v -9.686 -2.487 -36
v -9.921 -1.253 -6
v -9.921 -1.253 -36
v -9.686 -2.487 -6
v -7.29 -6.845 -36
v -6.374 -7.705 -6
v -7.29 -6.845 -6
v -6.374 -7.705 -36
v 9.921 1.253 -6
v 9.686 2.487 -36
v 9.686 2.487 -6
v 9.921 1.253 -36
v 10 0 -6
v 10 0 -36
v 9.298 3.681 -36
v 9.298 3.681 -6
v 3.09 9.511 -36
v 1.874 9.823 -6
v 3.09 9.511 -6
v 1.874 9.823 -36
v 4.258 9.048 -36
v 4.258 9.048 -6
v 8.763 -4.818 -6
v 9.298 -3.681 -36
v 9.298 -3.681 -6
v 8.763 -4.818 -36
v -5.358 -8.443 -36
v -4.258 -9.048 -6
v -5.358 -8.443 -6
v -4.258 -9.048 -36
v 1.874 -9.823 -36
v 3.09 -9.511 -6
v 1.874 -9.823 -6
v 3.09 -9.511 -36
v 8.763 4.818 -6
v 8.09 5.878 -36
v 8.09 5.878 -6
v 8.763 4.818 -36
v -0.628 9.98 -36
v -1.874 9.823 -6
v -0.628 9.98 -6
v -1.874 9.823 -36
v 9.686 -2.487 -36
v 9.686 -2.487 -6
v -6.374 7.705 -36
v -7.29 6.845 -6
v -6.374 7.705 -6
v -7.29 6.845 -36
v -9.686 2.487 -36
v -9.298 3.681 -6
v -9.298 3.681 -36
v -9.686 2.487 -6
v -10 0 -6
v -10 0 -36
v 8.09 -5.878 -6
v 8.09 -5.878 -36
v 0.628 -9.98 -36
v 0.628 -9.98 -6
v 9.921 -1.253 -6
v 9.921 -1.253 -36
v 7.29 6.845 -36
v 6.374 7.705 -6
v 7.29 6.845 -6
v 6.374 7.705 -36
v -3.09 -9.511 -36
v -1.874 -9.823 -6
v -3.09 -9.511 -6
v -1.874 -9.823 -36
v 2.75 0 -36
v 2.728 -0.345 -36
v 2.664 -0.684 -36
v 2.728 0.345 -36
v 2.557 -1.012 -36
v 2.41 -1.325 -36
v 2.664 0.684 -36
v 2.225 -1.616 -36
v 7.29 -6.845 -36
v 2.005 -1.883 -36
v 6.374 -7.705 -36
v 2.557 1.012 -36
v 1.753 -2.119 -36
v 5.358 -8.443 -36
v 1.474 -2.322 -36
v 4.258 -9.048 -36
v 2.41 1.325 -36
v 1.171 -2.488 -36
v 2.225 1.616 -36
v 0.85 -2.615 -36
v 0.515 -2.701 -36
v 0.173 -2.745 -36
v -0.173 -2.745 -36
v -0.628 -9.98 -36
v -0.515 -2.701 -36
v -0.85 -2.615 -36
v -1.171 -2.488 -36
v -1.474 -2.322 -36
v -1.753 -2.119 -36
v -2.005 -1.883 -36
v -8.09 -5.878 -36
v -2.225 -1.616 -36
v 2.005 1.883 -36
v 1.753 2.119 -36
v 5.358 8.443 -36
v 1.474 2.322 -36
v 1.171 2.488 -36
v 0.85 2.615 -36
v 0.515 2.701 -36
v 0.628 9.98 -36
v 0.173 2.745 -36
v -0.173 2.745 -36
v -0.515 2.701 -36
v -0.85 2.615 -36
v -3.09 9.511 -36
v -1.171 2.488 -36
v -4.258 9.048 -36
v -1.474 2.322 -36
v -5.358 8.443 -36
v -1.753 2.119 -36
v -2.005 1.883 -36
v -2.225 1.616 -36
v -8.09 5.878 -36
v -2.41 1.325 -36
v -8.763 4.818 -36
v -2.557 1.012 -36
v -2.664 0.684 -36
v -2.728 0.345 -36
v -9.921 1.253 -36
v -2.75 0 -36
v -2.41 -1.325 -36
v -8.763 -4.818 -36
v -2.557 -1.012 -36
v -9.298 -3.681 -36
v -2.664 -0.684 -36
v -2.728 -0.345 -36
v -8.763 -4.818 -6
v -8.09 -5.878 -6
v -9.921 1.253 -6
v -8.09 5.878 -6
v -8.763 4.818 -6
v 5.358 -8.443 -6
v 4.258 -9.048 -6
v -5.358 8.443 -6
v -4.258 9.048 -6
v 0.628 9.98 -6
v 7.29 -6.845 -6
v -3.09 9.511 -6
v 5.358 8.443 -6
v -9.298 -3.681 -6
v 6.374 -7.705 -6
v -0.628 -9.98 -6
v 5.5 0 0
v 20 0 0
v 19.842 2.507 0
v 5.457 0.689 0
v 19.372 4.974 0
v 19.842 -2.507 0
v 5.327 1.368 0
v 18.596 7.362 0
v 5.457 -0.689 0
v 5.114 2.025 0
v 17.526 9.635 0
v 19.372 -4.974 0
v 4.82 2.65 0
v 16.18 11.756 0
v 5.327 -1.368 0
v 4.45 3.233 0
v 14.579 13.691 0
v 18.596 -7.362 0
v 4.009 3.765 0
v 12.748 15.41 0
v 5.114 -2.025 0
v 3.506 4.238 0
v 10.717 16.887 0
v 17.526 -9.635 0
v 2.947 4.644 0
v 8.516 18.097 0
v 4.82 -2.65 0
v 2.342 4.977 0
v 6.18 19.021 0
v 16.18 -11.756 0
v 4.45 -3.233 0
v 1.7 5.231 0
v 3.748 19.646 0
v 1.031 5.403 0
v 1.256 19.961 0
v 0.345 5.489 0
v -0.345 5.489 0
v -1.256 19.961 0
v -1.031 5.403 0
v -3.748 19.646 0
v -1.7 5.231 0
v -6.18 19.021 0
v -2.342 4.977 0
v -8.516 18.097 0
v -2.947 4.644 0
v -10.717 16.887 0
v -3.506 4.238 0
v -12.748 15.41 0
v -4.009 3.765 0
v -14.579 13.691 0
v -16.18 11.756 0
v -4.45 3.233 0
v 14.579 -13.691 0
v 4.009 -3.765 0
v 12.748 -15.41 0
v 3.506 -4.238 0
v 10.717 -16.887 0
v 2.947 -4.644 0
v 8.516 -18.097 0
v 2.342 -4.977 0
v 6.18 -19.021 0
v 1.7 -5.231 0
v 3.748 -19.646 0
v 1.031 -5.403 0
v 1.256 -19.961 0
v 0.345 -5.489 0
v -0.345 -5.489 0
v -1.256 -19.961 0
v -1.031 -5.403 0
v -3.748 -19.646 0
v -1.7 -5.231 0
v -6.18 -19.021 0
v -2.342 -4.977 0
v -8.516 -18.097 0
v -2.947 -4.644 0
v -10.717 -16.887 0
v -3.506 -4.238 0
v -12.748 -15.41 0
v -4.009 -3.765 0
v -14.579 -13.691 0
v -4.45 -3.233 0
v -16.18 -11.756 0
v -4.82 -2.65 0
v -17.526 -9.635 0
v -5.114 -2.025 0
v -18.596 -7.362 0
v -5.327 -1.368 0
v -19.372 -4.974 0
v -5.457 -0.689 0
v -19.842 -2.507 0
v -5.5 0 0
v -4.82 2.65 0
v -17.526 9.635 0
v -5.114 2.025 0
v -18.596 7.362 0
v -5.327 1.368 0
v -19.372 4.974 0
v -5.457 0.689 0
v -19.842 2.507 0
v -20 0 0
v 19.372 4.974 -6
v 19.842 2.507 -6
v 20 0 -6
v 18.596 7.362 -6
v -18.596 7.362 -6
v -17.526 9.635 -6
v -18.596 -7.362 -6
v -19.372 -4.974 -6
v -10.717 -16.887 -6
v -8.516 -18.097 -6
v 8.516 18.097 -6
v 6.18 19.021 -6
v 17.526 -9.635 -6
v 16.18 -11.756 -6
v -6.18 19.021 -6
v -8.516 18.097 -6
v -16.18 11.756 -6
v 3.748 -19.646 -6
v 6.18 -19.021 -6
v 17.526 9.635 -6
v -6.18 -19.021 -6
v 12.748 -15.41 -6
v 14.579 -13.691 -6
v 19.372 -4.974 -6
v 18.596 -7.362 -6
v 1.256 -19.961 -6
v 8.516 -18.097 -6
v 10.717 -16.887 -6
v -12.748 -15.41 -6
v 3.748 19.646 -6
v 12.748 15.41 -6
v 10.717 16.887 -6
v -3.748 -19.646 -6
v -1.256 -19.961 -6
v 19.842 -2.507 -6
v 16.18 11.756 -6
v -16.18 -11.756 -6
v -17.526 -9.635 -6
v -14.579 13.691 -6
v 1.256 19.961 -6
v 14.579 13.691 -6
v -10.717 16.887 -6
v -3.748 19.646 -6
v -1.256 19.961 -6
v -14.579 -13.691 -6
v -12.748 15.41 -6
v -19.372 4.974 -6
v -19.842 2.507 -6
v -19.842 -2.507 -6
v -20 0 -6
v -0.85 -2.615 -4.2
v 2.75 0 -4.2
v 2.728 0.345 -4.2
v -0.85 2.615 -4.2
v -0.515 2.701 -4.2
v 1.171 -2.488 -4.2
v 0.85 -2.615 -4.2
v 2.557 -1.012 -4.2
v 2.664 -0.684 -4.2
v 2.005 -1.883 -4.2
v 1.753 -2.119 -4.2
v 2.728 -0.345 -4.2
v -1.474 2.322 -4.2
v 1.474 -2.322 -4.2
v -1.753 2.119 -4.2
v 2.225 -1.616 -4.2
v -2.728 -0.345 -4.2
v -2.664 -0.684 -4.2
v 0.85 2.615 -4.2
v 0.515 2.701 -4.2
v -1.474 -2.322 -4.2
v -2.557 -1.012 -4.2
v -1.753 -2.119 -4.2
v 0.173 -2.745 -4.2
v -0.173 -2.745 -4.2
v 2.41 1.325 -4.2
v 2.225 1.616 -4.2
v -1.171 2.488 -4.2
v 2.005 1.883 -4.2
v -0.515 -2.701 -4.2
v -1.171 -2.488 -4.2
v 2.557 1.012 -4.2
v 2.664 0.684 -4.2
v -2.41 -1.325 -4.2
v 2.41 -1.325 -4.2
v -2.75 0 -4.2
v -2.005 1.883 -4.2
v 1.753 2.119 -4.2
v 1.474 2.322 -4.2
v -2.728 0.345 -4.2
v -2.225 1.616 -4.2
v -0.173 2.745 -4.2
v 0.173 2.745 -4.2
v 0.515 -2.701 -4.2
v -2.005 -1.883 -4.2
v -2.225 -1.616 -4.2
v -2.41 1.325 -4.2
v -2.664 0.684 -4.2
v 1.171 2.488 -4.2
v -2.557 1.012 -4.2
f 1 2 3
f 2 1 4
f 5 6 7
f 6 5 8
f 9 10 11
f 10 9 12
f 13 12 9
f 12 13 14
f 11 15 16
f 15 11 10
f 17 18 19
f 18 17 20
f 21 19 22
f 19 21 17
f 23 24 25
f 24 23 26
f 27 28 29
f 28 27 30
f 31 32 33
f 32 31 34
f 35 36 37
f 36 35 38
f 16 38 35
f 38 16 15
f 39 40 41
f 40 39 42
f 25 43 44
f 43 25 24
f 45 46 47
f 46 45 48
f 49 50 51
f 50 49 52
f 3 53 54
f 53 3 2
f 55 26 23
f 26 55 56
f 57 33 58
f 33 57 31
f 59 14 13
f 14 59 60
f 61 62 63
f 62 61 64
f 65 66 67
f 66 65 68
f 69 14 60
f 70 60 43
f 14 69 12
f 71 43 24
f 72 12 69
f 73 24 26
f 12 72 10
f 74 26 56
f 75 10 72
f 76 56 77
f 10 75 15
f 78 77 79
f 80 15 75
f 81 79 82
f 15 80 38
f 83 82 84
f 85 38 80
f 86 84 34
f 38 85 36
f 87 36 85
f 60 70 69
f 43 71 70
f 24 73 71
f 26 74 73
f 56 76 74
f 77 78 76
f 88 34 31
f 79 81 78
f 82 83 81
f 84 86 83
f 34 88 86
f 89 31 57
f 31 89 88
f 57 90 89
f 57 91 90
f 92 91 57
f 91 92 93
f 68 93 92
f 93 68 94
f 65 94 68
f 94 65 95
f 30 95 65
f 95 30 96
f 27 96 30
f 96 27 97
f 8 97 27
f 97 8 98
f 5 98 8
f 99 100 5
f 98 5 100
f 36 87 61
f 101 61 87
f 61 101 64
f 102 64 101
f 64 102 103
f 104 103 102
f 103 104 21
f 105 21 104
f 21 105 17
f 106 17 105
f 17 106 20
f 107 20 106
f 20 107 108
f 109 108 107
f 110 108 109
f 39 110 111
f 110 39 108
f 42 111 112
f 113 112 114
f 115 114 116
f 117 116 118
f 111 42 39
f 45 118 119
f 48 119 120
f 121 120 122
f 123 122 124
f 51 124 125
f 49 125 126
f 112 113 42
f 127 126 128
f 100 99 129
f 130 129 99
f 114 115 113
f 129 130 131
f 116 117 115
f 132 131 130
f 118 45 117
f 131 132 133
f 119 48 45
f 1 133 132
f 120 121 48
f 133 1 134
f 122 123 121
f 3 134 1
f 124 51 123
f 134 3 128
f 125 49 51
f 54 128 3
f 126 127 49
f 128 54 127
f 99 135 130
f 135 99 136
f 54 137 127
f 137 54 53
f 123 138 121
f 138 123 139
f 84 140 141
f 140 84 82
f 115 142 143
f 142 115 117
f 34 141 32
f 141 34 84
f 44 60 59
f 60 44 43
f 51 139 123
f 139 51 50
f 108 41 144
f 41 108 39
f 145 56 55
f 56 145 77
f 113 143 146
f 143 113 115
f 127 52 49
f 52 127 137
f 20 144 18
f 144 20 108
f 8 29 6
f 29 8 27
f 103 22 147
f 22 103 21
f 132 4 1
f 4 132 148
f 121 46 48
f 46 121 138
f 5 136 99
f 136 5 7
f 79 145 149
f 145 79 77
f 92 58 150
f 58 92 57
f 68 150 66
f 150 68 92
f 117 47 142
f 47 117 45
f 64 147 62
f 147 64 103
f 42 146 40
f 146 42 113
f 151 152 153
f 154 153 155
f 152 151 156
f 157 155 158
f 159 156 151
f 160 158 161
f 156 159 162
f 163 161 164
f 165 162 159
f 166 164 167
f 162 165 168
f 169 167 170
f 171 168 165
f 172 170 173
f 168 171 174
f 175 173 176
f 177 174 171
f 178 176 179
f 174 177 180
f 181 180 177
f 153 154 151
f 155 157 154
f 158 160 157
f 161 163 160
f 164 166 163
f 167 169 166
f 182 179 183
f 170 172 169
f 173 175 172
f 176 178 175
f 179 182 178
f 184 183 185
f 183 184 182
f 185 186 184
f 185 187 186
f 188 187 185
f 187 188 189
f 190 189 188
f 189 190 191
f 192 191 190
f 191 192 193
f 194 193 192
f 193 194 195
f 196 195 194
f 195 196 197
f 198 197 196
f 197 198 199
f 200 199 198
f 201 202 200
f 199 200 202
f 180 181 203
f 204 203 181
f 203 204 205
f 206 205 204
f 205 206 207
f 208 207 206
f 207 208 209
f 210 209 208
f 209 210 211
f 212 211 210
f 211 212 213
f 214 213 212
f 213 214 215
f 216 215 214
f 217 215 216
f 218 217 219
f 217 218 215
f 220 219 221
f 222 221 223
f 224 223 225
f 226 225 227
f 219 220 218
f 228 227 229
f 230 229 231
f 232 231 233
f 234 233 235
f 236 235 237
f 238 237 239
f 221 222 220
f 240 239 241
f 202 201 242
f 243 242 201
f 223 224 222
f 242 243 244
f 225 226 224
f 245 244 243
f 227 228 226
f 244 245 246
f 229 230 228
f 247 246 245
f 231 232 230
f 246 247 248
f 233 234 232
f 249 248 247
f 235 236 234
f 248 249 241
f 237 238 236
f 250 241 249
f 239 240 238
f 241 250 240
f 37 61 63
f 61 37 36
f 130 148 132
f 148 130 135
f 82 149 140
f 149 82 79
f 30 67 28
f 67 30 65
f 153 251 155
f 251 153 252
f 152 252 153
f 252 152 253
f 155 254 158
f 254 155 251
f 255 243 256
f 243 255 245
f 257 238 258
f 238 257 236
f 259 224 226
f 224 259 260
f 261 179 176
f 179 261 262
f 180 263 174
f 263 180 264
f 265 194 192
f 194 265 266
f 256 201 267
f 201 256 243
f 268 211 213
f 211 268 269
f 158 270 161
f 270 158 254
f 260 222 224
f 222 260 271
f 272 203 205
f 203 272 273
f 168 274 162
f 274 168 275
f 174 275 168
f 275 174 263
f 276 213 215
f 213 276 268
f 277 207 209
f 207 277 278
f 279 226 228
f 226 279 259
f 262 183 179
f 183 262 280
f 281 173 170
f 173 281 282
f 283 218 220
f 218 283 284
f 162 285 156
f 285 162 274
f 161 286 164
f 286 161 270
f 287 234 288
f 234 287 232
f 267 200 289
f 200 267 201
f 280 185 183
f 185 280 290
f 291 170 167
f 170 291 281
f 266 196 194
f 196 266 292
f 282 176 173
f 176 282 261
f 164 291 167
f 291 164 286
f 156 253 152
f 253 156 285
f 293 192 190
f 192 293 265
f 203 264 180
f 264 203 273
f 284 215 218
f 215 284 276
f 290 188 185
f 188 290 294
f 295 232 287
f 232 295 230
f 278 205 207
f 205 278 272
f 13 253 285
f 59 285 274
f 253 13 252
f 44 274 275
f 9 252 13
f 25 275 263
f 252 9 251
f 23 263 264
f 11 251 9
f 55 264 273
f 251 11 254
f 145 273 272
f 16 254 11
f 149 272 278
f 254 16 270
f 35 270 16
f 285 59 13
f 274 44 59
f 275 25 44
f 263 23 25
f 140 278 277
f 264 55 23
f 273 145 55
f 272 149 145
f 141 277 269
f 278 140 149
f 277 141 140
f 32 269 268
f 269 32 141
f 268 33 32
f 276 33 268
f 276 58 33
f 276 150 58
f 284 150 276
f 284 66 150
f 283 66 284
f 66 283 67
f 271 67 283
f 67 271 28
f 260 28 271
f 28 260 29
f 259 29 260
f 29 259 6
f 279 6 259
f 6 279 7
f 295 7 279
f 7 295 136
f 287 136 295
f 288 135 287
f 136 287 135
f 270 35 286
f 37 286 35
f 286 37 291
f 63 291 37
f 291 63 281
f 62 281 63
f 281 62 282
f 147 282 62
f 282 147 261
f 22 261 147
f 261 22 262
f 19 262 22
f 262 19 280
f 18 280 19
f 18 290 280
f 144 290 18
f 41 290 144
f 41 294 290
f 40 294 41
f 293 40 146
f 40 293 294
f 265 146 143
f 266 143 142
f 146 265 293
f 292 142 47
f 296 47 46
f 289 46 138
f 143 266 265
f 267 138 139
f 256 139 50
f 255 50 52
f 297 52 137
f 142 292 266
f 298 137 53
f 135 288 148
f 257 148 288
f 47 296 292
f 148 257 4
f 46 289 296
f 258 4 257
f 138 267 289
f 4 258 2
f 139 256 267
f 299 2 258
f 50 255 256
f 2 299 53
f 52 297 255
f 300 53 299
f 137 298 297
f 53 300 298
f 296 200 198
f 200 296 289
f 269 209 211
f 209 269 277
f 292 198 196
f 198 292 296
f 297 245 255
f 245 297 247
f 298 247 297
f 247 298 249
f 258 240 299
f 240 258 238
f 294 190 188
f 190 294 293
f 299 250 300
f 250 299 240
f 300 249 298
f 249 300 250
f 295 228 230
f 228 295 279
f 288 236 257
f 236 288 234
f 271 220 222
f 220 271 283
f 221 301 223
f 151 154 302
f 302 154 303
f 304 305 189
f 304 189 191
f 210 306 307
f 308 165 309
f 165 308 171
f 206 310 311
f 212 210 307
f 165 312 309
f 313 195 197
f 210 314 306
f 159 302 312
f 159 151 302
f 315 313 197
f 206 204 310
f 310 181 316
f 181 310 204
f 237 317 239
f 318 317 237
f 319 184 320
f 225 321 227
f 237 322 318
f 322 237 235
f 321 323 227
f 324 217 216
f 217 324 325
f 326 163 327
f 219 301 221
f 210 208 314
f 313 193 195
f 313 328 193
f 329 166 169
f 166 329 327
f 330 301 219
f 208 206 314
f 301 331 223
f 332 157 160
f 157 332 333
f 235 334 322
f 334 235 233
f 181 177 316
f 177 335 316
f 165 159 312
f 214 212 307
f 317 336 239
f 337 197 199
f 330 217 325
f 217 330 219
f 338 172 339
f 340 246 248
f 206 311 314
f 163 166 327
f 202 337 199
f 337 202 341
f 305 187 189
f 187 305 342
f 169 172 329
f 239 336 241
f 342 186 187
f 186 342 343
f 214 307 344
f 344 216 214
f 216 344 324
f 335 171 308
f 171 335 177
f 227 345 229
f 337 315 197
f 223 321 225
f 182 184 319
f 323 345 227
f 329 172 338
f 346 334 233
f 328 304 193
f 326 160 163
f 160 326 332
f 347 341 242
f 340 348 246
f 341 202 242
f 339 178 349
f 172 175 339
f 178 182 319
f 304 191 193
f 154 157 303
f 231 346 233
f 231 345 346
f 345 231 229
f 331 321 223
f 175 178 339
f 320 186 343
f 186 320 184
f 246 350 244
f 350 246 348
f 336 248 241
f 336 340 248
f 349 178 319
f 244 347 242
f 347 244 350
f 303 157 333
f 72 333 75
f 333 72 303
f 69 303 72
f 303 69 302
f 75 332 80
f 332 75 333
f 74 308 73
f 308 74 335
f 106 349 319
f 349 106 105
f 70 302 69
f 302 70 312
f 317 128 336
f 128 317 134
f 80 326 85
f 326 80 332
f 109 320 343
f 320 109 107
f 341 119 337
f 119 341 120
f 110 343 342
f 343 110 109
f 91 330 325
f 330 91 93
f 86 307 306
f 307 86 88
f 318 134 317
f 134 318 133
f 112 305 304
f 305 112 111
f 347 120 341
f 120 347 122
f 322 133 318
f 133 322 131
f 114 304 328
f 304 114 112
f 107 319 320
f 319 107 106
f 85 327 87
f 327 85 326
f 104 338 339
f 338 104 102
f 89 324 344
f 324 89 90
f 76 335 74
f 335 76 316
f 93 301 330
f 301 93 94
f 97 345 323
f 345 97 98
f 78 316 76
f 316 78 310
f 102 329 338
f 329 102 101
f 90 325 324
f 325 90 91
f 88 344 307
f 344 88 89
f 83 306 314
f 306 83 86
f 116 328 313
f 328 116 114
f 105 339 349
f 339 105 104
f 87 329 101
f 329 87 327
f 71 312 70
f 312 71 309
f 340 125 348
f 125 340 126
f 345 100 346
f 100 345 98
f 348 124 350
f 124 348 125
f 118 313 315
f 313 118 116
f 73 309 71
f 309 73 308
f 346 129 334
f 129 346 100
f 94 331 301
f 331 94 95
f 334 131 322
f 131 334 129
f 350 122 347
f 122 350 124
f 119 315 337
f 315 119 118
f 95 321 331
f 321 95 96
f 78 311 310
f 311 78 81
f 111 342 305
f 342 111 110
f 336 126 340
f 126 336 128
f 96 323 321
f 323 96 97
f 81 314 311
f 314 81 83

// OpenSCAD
$fn = 50;


difference() {
	union() {
		translate(v = [0, 0, -36.0000000000]) {
			cylinder(h = 36, r = 10.0000000000);
		}
		translate(v = [0, 0, -6.0000000000]) {
			cylinder(h = 6, r = 20.0000000000);
		}
	}
	union() {
		translate(v = [0, 0, 0]) {
			rotate(a = [0, 0, 0]) {
				difference() {
					union() {
						#translate(v = [0, 0, -36.0000000000]) {
							cylinder(h = 36, r = 2.2500000000);
						}
						#translate(v = [0, 0, -4.2000000000]) {
							cylinder(h = 4.2000000000, r = 10.0000000000, r1 = 2.7500000000, r2 = 5.5000000000);
						}
						#translate(v = [0, 0, -36.0000000000]) {
							cylinder(h = 36, r = 2.7500000000);
						}
						#translate(v = [0, 0, -36.0000000000]) {
							cylinder(h = 36, r = 2.2500000000);
						}
					}
					union();
				}
			}
		}
	}
}
